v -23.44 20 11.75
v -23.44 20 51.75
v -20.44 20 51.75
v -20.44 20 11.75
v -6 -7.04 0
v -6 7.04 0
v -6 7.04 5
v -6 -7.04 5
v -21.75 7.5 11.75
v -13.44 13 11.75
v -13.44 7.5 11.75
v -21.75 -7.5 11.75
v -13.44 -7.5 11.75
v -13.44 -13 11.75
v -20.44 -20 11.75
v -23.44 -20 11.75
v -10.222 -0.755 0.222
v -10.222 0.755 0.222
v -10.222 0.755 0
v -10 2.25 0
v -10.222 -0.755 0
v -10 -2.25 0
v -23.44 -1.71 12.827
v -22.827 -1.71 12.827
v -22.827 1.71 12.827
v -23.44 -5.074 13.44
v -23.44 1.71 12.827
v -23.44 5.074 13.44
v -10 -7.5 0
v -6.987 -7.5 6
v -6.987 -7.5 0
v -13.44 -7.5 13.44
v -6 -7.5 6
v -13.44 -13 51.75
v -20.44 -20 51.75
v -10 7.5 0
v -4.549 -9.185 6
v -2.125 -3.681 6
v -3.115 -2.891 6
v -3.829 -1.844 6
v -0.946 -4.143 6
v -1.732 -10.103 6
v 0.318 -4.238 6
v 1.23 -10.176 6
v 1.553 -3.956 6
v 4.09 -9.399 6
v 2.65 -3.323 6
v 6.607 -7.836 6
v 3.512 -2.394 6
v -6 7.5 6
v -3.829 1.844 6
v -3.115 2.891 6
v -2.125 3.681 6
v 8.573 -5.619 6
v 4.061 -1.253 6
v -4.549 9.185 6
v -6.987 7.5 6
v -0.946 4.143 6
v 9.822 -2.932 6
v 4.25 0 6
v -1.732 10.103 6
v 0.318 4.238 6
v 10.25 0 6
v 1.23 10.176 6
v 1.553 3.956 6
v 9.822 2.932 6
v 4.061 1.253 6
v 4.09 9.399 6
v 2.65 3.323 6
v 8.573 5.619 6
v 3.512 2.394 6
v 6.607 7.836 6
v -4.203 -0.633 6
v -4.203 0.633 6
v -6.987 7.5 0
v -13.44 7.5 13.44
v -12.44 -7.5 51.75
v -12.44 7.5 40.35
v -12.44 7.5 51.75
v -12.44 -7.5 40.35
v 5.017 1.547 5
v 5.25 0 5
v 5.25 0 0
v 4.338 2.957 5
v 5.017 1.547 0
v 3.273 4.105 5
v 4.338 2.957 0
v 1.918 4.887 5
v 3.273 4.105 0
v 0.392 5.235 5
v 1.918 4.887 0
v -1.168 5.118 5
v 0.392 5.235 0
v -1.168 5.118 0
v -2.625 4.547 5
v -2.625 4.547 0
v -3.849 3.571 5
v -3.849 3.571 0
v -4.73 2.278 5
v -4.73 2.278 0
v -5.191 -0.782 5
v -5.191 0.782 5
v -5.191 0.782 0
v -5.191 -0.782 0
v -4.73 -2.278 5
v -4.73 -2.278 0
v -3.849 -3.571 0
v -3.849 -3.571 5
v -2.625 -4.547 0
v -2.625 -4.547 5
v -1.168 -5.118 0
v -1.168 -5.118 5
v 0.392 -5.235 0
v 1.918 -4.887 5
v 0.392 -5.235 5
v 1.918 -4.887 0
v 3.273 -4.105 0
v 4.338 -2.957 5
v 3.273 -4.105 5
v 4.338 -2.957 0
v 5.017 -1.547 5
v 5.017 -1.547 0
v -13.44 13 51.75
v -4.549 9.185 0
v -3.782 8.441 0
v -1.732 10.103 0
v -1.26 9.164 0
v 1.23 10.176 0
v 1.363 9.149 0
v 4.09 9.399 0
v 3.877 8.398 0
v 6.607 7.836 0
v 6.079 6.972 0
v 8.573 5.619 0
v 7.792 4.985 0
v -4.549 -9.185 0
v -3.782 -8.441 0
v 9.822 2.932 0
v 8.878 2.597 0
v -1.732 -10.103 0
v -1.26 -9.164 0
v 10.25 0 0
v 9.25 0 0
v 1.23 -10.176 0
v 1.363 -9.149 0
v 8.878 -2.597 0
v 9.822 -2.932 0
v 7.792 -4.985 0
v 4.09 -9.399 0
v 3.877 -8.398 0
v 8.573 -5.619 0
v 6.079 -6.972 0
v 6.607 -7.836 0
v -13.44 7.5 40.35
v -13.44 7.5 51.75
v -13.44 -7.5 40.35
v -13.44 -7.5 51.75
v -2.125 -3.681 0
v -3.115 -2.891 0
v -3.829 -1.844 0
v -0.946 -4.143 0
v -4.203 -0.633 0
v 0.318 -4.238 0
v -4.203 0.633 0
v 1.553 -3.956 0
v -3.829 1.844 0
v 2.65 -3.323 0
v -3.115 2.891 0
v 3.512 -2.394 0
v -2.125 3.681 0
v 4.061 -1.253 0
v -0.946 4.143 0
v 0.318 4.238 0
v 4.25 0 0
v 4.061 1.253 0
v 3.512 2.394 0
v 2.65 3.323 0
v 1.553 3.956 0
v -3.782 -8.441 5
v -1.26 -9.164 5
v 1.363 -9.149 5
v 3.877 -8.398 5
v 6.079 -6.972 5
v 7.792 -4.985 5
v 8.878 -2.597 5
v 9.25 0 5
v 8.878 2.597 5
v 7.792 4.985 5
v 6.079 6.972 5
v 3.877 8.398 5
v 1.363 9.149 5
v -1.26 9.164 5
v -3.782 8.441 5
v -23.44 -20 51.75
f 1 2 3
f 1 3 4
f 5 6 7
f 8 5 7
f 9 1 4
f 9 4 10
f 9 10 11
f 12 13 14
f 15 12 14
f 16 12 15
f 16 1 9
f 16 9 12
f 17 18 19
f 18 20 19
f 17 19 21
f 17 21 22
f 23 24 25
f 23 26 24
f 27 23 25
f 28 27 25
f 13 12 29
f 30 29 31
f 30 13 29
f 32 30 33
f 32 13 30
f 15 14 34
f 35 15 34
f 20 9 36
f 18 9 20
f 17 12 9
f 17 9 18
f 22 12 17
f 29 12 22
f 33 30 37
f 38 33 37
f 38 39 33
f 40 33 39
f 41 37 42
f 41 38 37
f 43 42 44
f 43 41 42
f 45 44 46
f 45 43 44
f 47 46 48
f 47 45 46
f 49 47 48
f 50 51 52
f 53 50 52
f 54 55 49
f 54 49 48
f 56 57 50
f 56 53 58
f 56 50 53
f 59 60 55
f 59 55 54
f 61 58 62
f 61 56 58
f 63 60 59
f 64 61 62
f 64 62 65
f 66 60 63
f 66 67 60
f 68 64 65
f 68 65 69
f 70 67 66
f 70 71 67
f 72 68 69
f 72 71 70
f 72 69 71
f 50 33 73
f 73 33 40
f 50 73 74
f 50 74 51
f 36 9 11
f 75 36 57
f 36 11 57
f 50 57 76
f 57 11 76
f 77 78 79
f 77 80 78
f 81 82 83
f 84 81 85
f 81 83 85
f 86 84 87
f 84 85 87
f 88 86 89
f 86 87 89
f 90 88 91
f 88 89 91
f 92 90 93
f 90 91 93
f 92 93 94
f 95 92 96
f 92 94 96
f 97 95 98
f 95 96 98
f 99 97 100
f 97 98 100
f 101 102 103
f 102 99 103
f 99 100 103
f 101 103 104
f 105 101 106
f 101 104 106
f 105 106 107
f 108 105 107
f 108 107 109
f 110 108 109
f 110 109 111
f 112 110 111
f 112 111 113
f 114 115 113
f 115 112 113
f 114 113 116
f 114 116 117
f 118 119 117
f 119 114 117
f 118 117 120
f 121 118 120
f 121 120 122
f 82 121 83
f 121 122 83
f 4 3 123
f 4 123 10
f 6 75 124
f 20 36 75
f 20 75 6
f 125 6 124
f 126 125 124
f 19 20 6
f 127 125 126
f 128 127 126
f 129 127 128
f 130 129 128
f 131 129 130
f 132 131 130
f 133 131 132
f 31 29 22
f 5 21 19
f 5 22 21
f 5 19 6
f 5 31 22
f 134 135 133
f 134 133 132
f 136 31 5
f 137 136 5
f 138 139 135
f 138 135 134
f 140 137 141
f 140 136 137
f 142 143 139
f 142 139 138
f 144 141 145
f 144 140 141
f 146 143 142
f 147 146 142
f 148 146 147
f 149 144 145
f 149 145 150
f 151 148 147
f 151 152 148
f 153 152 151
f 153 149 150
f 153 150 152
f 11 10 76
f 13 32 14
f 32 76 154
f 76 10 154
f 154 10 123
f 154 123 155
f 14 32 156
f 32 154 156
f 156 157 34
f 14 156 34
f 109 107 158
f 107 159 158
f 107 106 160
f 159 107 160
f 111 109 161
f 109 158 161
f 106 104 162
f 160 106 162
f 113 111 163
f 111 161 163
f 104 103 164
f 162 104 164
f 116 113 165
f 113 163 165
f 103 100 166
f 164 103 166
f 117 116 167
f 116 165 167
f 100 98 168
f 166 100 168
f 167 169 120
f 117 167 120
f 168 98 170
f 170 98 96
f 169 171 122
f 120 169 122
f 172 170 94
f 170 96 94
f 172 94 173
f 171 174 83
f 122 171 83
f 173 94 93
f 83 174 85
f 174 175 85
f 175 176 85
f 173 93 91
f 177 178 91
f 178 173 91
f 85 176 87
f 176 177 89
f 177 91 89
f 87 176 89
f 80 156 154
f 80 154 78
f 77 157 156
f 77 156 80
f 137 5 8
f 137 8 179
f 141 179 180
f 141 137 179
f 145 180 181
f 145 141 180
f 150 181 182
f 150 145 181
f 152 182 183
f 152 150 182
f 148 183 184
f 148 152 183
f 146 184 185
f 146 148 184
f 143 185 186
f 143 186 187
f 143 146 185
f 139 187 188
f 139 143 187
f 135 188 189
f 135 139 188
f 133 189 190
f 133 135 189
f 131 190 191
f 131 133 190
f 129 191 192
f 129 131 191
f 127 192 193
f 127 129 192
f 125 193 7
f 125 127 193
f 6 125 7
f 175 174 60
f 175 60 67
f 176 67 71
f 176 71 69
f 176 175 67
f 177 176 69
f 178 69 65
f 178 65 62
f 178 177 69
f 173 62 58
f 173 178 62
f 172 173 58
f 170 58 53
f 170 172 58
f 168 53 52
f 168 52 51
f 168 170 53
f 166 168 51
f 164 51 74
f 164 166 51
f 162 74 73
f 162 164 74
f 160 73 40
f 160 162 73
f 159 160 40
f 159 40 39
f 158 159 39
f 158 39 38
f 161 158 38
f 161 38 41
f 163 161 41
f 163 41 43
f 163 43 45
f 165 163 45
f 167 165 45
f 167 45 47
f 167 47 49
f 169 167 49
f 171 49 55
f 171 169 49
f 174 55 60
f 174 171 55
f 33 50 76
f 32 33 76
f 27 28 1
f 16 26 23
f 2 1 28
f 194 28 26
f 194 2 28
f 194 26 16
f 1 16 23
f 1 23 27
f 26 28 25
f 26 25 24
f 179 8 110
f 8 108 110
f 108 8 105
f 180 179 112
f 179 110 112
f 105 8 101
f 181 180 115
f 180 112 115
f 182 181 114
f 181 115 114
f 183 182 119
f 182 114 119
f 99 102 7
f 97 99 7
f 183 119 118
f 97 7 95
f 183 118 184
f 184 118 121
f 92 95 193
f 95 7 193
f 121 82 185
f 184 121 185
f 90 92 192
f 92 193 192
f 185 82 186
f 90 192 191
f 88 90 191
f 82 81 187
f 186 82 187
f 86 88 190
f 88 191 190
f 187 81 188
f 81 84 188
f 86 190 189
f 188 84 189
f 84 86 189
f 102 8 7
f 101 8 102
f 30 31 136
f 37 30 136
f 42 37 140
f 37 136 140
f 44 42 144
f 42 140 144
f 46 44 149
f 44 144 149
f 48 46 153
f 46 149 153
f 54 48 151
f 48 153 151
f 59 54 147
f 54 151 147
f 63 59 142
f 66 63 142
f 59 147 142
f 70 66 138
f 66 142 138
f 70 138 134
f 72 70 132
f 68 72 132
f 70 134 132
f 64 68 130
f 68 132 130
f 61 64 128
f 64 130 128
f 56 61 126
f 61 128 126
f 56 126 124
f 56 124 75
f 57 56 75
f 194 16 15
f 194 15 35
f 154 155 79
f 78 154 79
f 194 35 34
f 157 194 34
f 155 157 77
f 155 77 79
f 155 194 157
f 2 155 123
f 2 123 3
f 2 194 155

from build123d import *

# Parameters (mm, degrees)
F0_R     = 10.25
F0_R_2   = 4.25
F1_DEPTH = 6
F2_T     = -1
F4_DEPTH = 7.5
F6_DEPTH = 10
F7_SIZE  = 7


# Not quite as in the source:
# - a feature names something its author has since deleted; it is built from what else it names


with BuildPart() as f1:
    # F0 (on Top) → F1 (new body)
    with BuildSketch(Plane.XY):
        Circle(F0_R)
        Circle(F0_R_2, mode=Mode.SUBTRACT)
    extrude(amount=F1_DEPTH)

    # F2
    f2_openings = [f1.faces().sort_by_distance(p)[0] for p in [
        (-9.960086, 0, 0),
    ]]
    offset(amount=F2_T, openings=f2_openings)

    # F3 (on Front) → F4 (join, symmetric)
    with BuildSketch(Plane.XZ):
        Polygon((-23.44, 51.75), (-23.44, 13.44), (-10, 0), (-6, 0), (-6, 6), (-13.44, 13.44), (-13.44, 40.35), (-12.44, 40.35), (-12.44, 51.75), align=None)
    extrude(amount=F4_DEPTH, both=True)

    # F5 (on face) → F6 (join, through all)
    with BuildSketch(Plane(origin=(-23.44, 0, 0), x_dir=(0, -1, 0), z_dir=(-1, 0, 0))):
        with BuildLine():
            Line((20, 11.75), (20, 51.75))
            Line((20, 51.75), (7.5, 51.75))
            Line((7.5, 51.75), (7.5, 49.2070902501))
            ThreePointArc((7.5, 49.2070902501), (15.8666316526, 42.2022724802), (19, 31.75))
            ThreePointArc((19, 31.75), (15.8666316526, 21.2977275198), (7.5, 14.2929097499))
            Line((7.5, 14.2929097499), (7.5, 13.44))
            Line((7.5, 13.44), (5.0738446961, 13.44))
            ThreePointArc((5.0738446961, 13.44), (0, 12.75), (-5.0738446961, 13.44))
            Line((-5.0738446961, 13.44), (-7.5, 13.44))
            Line((-7.5, 13.44), (-7.5, 14.2929097499))
            ThreePointArc((-7.5, 14.2929097499), (-19, 31.75), (-7.5, 49.2070902501))
            Line((-7.5, 49.2070902501), (-7.5, 51.75))
            Line((-7.5, 51.75), (-20, 51.75))
            Line((-20, 51.75), (-20, 11.75))
            Line((-20, 11.75), (20, 11.75))
        make_face()
        with BuildLine():
            ThreePointArc((19, 31.75), (15.8666316526, 42.2022724802), (7.5, 49.2070902501))
            Line((7.5, 49.2070902501), (7.5, 14.2929097499))
            ThreePointArc((7.5, 14.2929097499), (15.8666316526, 21.2977275198), (19, 31.75))
        make_face()
        with BuildLine():
            Line((-7.5, 14.2929097499), (-7.5, 49.2070902501))
            ThreePointArc((-7.5, 49.2070902501), (-19, 31.75), (-7.5, 14.2929097499))
        make_face()
    extrude(amount=-F6_DEPTH)

    # F7
    f7_edges = [f1.edges().sort_by_distance(p)[0] for p in [
        (-13.44, -20, 31.75),
        (-13.44, 20, 31.75),
    ]]
    chamfer(f7_edges, length=F7_SIZE)


solid = f1.part
